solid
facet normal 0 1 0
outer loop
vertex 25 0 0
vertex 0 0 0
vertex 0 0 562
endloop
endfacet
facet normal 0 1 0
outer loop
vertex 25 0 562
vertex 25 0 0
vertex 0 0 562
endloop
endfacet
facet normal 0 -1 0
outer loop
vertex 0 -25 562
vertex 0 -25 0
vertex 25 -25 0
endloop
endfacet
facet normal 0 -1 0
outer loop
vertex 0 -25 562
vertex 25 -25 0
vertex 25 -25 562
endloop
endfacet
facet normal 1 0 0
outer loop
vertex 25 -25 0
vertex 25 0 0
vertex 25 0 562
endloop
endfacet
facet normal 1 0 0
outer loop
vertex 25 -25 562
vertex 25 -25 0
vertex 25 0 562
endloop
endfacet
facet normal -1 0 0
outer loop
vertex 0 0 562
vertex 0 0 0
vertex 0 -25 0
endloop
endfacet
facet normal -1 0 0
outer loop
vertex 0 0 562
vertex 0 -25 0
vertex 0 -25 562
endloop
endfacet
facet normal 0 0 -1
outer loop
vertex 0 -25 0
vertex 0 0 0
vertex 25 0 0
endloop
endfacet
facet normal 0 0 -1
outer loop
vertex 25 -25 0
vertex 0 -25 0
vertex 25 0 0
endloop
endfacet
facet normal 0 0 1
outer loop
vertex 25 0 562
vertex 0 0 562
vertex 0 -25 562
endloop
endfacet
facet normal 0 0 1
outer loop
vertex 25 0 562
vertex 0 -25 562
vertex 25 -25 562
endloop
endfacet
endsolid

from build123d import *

# Parameters (mm, degrees)
F0_W     = 38.7412980199
F0_H     = 41.0243943334
F1_DEPTH = 562
F2_DEPTH = 25
F3_DEPTH = 25


with BuildPart() as f1:
    # F0 (on Top) → F1 (new body)
    with BuildSketch(Plane.XY):
        with Locations((19.3706490099, -20.5121971667)):
            Rectangle(F0_W, F0_H)
    extrude(amount=F1_DEPTH)

    # F2 (intersect): a face of the model
    f2_faces = [f1.faces().sort_by_distance(p)[0] for p in [
        (0, -20.5121971667, 281),
    ]]
    extrude(f2_faces, amount=-F2_DEPTH, mode=Mode.INTERSECT)

    # F3 (intersect): a face of the model
    f3_faces = [f1.faces().sort_by_distance(p)[0] for p in [
        (12.5, 0, 281),
    ]]
    extrude(f3_faces, amount=-F3_DEPTH, mode=Mode.INTERSECT)


solid = f1.part
